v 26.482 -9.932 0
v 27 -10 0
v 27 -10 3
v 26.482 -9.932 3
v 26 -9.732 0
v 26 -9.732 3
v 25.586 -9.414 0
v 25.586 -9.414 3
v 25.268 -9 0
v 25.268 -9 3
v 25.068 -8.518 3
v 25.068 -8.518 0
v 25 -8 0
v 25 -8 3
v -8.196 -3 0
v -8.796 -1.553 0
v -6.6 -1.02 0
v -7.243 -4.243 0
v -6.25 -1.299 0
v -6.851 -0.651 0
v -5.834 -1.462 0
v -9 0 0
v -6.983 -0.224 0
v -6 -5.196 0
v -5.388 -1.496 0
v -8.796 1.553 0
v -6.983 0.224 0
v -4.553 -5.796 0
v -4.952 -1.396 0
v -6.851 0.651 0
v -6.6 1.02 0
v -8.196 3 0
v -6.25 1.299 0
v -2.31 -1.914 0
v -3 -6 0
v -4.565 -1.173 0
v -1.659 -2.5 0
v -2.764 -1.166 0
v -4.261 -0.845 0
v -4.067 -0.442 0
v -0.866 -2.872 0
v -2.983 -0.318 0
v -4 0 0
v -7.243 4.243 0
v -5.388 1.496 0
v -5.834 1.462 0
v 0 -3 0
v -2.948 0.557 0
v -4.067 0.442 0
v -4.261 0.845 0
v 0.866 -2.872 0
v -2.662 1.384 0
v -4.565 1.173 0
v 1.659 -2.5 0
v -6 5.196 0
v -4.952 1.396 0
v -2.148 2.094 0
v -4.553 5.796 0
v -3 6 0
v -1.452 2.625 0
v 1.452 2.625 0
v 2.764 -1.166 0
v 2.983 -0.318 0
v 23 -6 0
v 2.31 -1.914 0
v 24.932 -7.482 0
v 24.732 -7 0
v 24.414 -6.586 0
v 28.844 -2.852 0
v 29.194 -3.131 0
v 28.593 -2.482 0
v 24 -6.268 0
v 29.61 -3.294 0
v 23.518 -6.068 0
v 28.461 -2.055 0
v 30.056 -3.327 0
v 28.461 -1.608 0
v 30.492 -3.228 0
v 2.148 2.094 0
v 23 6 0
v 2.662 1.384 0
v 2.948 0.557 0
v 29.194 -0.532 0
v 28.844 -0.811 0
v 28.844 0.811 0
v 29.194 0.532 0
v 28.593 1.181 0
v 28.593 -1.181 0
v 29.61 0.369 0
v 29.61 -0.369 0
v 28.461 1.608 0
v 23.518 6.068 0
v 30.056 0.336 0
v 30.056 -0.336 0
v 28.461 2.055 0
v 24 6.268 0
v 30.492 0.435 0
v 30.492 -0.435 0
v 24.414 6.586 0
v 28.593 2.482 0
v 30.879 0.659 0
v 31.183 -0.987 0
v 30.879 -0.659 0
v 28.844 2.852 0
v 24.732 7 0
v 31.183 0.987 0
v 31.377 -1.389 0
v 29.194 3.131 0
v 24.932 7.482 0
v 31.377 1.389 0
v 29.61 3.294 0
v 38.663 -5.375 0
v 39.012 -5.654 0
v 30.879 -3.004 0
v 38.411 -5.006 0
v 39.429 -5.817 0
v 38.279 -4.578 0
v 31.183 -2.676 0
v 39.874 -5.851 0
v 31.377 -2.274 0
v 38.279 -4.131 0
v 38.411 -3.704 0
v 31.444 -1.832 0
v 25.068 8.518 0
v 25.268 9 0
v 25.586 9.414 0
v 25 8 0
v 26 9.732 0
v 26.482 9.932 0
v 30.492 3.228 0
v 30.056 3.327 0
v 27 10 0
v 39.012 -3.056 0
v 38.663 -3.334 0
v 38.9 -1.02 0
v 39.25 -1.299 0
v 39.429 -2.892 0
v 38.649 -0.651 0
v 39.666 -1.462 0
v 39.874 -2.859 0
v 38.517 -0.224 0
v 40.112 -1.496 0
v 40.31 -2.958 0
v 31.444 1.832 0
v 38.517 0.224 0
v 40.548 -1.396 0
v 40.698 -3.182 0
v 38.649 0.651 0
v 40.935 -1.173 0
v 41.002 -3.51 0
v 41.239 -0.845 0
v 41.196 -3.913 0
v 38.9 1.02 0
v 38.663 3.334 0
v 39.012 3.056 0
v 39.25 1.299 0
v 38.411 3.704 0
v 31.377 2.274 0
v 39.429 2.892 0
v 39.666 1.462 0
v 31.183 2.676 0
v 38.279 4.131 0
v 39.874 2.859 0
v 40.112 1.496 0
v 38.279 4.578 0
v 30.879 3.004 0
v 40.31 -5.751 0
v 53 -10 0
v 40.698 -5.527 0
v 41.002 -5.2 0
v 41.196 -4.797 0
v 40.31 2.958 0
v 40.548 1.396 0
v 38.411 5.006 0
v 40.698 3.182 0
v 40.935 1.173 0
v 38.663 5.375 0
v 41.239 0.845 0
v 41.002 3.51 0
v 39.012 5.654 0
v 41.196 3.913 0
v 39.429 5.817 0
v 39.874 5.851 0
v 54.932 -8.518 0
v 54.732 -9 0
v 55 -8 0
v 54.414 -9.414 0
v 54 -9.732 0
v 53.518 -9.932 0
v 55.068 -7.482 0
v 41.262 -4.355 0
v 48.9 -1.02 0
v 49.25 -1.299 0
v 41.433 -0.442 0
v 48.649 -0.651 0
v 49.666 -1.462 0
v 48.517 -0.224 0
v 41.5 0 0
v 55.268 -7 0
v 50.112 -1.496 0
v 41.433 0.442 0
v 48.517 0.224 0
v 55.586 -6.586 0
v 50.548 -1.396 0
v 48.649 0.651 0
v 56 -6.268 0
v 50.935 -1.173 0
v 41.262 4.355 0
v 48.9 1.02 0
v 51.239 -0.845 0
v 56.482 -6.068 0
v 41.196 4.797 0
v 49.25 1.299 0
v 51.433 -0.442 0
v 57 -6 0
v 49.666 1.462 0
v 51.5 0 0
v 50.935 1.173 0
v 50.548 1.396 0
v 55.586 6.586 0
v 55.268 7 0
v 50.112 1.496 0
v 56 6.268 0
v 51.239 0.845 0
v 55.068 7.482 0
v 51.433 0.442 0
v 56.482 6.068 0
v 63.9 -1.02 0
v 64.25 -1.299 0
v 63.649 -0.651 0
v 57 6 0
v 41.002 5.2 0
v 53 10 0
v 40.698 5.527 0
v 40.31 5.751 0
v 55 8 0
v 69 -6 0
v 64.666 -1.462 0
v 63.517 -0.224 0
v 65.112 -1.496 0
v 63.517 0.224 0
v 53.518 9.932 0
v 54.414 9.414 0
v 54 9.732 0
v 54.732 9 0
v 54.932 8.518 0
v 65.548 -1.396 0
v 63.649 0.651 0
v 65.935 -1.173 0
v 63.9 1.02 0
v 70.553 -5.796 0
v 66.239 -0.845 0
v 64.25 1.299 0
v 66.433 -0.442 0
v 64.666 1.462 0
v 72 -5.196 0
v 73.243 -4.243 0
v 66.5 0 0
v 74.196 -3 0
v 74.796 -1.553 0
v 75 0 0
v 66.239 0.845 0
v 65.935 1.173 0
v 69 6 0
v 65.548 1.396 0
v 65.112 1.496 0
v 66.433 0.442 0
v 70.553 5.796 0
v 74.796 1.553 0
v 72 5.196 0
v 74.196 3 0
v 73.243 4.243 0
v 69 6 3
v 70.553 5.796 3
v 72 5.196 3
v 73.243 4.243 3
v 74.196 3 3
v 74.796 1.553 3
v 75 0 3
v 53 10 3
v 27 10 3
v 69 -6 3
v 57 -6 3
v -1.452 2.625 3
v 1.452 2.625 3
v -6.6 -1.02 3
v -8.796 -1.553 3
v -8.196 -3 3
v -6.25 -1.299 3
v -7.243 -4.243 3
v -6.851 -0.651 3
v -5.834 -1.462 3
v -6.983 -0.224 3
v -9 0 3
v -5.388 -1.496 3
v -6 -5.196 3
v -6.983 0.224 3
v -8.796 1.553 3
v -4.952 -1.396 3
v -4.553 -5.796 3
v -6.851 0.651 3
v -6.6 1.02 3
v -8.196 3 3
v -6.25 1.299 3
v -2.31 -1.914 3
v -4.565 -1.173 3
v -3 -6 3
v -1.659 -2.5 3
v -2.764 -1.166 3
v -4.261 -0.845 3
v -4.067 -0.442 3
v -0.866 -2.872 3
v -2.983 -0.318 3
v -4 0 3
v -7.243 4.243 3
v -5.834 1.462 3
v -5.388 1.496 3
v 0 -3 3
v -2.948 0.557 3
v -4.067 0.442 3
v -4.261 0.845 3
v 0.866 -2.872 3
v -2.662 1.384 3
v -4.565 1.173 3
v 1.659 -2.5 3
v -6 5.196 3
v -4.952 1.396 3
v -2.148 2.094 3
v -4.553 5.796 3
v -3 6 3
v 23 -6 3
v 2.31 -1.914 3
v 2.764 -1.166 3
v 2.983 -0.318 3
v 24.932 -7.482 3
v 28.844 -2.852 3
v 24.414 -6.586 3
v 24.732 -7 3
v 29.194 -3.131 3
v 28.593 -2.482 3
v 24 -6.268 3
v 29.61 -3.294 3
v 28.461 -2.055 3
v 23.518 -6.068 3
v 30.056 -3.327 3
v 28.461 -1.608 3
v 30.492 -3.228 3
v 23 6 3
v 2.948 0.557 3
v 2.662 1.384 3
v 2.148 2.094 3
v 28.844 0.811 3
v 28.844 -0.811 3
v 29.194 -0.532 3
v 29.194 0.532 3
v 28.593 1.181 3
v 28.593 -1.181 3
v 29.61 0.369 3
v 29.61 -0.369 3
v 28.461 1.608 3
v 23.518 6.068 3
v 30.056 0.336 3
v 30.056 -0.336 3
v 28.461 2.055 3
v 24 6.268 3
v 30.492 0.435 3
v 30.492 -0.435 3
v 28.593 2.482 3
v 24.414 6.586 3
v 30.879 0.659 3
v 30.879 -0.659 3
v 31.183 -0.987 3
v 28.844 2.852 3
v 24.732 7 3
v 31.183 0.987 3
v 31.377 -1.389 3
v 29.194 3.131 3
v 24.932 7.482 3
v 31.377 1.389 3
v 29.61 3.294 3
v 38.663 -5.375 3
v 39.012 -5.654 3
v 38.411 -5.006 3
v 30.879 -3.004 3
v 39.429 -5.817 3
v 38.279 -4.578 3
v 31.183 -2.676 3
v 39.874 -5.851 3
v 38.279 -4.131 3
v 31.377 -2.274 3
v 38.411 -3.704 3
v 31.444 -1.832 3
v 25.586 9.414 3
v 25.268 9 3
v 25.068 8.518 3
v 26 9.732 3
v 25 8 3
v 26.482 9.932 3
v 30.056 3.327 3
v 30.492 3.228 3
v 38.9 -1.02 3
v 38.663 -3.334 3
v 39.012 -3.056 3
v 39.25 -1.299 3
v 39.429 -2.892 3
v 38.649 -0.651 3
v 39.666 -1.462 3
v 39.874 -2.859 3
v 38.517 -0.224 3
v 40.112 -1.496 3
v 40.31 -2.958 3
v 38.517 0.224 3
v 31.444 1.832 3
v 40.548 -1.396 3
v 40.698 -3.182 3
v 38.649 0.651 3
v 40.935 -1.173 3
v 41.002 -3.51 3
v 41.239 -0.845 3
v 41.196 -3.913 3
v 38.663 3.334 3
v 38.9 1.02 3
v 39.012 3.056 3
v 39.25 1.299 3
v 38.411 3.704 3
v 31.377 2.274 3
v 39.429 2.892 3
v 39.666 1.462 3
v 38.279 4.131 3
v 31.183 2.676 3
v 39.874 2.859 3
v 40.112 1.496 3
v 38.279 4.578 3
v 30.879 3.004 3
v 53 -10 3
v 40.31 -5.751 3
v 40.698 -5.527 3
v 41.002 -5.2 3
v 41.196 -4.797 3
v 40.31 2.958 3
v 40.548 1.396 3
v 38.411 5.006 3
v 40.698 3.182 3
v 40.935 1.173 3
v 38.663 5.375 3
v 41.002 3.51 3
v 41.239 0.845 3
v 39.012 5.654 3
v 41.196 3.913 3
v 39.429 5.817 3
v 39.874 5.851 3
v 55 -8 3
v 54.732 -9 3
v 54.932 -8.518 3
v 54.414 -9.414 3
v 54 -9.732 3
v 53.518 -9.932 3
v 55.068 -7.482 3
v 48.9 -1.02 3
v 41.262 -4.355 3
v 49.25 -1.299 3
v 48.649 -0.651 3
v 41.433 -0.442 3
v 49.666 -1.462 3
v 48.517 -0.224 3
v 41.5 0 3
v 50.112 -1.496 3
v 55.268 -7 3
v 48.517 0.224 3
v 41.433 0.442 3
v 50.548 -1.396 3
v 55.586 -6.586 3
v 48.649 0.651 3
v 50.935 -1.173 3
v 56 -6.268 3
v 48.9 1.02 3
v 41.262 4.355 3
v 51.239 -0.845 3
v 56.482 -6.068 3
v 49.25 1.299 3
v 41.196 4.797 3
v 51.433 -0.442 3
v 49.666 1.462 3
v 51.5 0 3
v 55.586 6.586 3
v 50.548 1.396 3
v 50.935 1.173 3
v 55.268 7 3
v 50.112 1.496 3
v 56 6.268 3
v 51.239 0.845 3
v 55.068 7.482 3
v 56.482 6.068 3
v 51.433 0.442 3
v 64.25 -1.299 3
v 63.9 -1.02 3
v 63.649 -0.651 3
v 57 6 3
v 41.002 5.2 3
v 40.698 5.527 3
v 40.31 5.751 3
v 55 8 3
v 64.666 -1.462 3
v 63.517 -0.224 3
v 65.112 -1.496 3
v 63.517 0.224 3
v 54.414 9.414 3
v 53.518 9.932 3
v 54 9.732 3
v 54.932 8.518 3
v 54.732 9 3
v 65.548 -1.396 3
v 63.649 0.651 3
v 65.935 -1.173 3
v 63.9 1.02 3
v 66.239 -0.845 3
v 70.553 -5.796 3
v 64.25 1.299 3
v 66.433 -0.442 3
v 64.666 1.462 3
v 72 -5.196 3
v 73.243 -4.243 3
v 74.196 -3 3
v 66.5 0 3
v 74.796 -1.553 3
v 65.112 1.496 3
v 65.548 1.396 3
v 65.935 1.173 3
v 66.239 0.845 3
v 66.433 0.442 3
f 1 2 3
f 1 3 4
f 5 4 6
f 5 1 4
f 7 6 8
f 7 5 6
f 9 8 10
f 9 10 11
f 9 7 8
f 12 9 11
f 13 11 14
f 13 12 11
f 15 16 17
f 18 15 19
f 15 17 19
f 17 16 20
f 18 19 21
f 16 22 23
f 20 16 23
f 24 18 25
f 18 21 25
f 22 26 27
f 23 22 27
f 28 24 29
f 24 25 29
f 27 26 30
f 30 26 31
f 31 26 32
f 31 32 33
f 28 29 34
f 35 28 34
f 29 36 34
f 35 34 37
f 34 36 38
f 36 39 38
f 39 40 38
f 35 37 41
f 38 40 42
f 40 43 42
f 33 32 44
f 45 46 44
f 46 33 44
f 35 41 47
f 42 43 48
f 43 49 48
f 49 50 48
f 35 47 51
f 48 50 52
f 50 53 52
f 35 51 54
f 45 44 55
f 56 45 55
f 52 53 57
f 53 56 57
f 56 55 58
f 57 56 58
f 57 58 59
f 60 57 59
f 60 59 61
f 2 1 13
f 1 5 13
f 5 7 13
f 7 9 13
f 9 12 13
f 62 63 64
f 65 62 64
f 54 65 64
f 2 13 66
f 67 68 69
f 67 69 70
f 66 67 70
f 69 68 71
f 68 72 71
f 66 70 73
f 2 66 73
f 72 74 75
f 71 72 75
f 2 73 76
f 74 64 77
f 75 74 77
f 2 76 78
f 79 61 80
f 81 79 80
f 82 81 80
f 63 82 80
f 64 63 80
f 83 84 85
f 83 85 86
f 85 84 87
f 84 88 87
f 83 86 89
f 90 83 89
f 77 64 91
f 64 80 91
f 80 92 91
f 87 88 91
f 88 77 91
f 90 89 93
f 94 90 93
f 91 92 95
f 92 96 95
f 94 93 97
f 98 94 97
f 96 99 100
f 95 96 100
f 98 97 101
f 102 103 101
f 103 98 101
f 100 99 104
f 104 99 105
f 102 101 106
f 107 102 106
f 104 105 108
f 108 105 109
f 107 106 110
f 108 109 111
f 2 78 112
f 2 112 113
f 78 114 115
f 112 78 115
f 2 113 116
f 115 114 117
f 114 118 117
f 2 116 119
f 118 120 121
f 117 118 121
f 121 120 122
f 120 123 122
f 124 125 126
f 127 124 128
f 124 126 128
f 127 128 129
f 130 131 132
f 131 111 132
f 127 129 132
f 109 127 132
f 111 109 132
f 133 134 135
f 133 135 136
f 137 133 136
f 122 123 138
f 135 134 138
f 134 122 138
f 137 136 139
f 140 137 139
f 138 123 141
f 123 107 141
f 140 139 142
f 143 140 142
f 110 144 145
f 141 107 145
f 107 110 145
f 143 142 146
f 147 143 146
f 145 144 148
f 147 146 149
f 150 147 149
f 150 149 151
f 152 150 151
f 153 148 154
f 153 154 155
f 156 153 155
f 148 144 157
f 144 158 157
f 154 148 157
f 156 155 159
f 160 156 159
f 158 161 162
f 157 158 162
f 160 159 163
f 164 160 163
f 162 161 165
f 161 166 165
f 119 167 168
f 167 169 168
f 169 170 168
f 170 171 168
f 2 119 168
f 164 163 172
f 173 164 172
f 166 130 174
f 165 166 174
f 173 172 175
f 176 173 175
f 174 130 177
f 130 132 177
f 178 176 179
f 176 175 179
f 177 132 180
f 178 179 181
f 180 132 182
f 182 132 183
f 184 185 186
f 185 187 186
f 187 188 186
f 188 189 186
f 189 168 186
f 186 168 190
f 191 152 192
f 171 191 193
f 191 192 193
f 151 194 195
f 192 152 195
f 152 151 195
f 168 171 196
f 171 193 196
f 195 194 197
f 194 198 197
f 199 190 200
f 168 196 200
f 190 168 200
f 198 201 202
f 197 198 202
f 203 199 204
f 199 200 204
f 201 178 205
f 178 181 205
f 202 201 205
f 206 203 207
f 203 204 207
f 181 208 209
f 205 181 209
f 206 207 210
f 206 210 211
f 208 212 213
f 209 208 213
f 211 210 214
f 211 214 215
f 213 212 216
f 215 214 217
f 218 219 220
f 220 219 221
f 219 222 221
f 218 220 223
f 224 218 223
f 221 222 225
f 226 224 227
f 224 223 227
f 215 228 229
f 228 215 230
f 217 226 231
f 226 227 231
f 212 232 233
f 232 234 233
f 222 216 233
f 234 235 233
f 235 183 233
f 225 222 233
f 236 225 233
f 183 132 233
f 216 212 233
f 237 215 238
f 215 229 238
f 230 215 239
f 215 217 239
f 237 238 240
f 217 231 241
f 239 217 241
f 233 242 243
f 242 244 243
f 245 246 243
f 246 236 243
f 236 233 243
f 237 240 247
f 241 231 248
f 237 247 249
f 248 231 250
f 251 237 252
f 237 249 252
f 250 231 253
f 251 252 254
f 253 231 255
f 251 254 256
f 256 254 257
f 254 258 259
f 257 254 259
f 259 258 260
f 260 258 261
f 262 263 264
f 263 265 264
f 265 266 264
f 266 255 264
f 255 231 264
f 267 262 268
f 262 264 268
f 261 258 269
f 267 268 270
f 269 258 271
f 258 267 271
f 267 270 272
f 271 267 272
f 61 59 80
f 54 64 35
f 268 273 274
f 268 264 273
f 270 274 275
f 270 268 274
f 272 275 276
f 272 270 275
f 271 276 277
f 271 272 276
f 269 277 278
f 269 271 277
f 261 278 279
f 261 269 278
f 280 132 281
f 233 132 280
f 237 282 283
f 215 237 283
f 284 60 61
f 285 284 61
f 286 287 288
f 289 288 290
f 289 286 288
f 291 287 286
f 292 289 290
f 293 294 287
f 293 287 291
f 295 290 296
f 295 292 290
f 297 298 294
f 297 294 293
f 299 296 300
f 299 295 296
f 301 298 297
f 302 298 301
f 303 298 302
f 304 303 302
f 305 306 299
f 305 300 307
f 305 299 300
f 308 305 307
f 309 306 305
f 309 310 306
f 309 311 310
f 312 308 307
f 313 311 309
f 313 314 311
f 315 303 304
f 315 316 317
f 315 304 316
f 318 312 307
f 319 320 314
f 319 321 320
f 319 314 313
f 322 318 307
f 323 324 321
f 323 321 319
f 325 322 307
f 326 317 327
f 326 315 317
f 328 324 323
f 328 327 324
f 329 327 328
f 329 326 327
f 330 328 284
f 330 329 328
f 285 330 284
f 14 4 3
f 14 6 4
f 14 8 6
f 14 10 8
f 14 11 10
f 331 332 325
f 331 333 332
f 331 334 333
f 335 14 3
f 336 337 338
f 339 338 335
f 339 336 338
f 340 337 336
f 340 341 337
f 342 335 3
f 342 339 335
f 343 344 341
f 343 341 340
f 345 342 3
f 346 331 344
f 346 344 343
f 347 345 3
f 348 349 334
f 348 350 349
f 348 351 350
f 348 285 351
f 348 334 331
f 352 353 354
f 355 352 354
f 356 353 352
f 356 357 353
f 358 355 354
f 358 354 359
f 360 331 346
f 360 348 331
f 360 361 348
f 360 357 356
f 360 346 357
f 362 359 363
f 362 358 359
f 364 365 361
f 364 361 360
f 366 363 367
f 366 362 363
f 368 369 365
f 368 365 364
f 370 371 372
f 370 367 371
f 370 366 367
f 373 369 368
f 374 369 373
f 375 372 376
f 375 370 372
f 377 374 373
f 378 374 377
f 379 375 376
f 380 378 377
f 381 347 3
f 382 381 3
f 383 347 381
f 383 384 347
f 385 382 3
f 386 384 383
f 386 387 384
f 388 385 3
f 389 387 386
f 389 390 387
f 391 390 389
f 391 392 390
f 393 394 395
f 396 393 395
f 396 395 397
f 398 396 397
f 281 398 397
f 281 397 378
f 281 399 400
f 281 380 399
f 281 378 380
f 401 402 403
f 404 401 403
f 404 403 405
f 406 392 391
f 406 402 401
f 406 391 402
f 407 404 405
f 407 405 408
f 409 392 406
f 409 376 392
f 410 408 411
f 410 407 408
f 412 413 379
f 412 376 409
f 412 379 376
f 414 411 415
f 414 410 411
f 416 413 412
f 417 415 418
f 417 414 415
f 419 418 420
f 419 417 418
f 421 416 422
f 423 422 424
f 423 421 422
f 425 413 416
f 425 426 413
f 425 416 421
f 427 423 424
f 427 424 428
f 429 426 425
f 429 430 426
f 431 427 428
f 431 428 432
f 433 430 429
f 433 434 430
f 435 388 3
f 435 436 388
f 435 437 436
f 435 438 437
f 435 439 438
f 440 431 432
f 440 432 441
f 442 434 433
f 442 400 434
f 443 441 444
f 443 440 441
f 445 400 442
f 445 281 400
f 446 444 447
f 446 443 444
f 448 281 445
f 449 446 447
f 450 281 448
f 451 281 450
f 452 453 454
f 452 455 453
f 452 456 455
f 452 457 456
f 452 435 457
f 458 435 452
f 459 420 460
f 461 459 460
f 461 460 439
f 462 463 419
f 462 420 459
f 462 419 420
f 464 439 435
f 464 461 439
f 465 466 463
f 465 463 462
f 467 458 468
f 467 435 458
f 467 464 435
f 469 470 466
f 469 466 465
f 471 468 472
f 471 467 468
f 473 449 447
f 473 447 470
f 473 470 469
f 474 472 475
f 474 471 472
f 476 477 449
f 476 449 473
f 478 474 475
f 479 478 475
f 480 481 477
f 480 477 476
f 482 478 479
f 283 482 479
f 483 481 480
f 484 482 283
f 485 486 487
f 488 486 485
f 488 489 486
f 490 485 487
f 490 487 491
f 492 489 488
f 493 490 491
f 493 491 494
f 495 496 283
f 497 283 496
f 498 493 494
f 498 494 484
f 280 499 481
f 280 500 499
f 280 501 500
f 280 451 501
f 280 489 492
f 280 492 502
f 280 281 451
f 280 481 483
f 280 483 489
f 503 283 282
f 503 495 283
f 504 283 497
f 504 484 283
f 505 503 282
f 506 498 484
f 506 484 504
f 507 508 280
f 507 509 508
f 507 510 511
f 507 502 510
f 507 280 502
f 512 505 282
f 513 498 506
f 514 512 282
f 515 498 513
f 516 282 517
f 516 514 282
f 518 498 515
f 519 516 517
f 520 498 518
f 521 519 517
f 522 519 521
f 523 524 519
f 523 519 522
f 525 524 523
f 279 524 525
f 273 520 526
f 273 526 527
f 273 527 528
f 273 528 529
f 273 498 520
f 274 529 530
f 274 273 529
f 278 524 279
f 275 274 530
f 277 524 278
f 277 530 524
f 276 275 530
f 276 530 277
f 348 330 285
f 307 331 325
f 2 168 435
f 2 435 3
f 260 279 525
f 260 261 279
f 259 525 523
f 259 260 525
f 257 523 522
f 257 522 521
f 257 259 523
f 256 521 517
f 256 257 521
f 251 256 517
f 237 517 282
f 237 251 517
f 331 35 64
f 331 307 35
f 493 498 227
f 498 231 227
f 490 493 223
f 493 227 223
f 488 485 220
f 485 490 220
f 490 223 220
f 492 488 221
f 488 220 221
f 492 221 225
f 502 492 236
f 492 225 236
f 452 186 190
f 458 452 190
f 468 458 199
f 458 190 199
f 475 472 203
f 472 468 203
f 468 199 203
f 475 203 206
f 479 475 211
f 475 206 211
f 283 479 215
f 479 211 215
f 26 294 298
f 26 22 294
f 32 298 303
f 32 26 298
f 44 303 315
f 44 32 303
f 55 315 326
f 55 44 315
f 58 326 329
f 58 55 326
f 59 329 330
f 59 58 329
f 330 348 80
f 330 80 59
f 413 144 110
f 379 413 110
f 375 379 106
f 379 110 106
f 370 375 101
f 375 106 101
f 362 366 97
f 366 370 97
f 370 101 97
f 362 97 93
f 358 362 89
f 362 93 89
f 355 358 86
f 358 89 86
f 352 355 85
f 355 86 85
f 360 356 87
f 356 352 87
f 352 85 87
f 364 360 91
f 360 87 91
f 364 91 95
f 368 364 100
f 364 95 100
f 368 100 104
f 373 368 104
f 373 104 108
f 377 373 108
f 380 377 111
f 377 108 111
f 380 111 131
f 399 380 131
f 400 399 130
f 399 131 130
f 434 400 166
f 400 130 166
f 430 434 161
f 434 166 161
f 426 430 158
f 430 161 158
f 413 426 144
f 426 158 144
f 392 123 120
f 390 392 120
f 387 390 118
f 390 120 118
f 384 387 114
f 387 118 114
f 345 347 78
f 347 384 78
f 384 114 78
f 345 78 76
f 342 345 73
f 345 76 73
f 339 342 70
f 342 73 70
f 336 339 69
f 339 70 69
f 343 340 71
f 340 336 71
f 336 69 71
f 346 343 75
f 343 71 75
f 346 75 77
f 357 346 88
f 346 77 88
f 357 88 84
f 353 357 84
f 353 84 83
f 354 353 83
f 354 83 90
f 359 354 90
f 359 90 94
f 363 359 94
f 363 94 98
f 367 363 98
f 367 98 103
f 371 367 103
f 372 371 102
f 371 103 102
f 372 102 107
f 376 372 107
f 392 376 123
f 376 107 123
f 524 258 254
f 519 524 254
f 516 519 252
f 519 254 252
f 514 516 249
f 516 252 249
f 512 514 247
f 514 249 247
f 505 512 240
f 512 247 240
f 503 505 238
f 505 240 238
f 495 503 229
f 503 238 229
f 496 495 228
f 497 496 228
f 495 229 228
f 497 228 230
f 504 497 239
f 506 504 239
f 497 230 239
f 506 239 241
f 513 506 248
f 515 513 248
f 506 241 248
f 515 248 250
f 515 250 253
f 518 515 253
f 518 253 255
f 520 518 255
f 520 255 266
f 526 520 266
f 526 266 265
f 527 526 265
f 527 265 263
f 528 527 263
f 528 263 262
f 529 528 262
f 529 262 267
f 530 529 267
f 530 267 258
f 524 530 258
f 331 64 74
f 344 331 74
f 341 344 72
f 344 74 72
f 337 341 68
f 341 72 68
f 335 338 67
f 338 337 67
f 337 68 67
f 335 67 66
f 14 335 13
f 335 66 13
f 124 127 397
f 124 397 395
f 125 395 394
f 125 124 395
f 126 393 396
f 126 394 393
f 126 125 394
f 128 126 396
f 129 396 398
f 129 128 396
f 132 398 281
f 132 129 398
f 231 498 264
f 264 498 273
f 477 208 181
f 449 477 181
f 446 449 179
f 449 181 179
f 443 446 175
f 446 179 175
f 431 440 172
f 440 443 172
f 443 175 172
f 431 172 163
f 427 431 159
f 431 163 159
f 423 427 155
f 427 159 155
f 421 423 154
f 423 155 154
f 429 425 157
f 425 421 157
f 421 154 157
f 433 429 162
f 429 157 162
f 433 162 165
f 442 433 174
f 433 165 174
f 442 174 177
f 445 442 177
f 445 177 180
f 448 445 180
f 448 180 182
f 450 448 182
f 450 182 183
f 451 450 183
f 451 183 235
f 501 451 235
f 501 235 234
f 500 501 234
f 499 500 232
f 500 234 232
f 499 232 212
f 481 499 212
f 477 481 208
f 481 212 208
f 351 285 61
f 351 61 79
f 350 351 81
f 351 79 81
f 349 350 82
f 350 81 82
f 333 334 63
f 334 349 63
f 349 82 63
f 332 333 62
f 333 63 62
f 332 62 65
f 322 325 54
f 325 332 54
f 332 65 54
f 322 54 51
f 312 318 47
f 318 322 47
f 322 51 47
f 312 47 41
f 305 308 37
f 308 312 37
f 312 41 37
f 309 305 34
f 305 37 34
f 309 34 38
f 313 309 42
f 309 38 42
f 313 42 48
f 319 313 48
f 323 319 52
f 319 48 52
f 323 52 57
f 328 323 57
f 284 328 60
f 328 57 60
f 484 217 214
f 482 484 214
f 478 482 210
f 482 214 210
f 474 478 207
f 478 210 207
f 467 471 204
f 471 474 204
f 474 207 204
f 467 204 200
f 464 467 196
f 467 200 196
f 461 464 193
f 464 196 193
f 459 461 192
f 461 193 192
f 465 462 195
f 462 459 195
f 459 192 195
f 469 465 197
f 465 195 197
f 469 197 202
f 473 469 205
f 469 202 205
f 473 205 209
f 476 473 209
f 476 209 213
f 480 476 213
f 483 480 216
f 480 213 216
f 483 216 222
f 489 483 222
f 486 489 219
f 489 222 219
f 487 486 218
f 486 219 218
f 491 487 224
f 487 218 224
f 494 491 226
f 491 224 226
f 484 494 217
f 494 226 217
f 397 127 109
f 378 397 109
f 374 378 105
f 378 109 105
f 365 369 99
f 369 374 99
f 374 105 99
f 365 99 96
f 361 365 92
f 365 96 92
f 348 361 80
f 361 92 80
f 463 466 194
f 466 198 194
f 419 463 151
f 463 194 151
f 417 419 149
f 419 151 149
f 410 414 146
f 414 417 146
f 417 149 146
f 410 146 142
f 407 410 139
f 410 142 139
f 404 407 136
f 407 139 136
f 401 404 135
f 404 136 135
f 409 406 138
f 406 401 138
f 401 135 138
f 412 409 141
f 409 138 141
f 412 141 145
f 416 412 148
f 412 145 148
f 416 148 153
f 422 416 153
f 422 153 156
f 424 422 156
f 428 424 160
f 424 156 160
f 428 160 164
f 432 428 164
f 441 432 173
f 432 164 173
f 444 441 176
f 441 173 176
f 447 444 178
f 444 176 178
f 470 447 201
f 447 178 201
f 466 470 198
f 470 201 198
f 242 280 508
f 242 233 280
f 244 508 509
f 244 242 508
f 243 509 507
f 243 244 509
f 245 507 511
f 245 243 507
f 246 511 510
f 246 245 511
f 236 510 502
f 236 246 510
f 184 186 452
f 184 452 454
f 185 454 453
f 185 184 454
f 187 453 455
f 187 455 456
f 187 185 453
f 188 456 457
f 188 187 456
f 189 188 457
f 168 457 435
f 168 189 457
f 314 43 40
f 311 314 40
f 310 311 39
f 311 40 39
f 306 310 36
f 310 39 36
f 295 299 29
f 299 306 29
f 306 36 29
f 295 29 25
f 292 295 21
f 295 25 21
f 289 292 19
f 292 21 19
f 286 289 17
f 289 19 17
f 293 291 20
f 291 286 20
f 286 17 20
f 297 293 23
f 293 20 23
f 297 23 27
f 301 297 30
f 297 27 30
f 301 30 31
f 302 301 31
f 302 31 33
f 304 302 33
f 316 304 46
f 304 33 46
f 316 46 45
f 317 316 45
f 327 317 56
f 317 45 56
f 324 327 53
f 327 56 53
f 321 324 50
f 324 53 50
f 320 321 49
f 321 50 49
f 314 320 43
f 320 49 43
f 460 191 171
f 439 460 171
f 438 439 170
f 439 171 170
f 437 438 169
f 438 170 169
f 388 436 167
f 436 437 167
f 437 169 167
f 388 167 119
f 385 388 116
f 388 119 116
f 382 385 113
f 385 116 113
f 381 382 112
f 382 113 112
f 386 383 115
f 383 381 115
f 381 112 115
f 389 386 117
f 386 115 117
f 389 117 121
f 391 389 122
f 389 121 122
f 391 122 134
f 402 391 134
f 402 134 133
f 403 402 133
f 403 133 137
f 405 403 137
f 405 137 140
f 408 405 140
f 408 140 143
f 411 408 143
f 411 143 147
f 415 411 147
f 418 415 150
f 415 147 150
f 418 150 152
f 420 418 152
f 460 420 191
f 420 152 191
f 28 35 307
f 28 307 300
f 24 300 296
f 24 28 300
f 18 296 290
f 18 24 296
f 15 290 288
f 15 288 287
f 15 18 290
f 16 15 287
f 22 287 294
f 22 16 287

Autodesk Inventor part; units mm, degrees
ref_plane "YZ Plane" through (0, 0, 0) normal (1, 0, 0) x (0, 1, 0)
ref_plane "XZ Plane" through (0, 0, 0) normal (0, 1, 0) x (-1, 0, 0)
ref_plane "XY Plane" through (0, 0, 0) normal (0, 0, 1) x (1, 0, 0)
sketch "Sketch1" plane through (0, 0, 0) normal (0, 0, 1) x (1, 0, 0)
  circle A0 centre (0, 0) radius 3
  line L0 (-1.4524, 2.625) -> (1.4524, 2.625)
  line L1 (-4.1421, -10) -> (-10, -4.1421)
  line L2 (-10, -4.1421) -> (-10, 4.1421)
  line L3 (-10, 4.1421) -> (-4.1421, 10)
  line L4 (-4.1421, 10) -> (4.1421, 10)
  line L5 (4.1421, 10) -> (10, 4.1421)
  line L6 (10, 4.1421) -> (10, -4.1421)
  line L7 (10, -4.1421) -> (4.1421, -10)
  line L8 (4.1421, -10) -> (-4.1421, -10)
  circle A1 centre (29.944, -1.8315) radius 1.5
  circle A2 centre (29.944, 1.8315) radius 1.5
  circle A3 centre (0, 0) radius 30 construction
  line L9 (0, 0) -> (30, 0) construction
  line L10 (0, 0) -> (29.944, 1.8315) construction
  line L11 (0, 0) -> (29.944, -1.8315) construction
  circle A4 centre (0, 0) radius 40 construction
  circle A5 centre (39.7623, 4.3547) radius 1.5
  circle A6 centre (40, 0) radius 1.5
  circle A7 centre (39.7623, -4.3547) radius 1.5
  line L12 (0, 0) -> (39.7623, 4.3547) construction
  line L13 (40, 0) -> (0, 0) construction
  line L14 (0, 0) -> (39.7623, -4.3547) construction
  circle A8 centre (50, 0) radius 1.5
  circle A9 centre (65, 0) radius 1.5
  circle A10 centre (-5.5, 0) radius 1.5
  line L15 (0, 0) -> (65, 0) construction
  line L16 (0, -10) -> (65, -10)
  line L17 (65, 10) -> (0, 10)
  arc A11 (0, 10) -> (0, -10) centre (0, 0) ccw
  arc A12 (65, -10) -> (65, 10) centre (65, 0) ccw
  line L18 (0, 10) -> (-10, 10)
  line L19 (-10, 10) -> (-10, -10)
  line L20 (-10, -10) -> (0, -10)
  line L21 (0, -10) -> (0, 10)
  line L22 (65, 10) -> (75, 10)
  line L23 (75, 10) -> (75, -10)
  line L24 (75, -10) -> (65, -10)
  line L25 (65, -10) -> (65, 10)
  point P0 (32.5, 0)
  point P1 (4.1421, -10)
  point P2 (0, 10)
  point P3 (0, 0)
  point P4 (65, 0)
  point P5 (75, 0)
  point P6 (-10, 0)
  dimension "d0" = 6
  dimension "d1" = 2.625
  dimension "d2" = 20
  dimension "d3" = 3
  dimension "d4" = 3
  dimension "d5" = 60
  dimension "d6" = 3.5
  dimension "d7" = 3.5
  dimension "d8" = 80
  dimension "d9" = 3
  dimension "d10" = 3
  dimension "d11" = 3
  dimension "d12" = 0
  dimension "d13" = 6.25
  dimension "d14" = 6.25
  dimension "d15" = 3
  dimension "d16" = 3
  dimension "d17" = 0
  dimension "d18" = 50
  dimension "d19" = 0
  dimension "d20" = 65
  dimension "d21" = 3
  dimension "d22" = 0
  dimension "d23" = 5.5
  dimension "d24" = 20
  dimension "d36" = 10
  dimension "d37" = 10
  dimension "d38" = 20
  dimension "d44" = 10
extrude "Extrusion1" add sketch "Sketch1" along normal blind 3 contours A0 L21 L4 L5 L6 L7 L8 | L0 L21 A0 | L21 A11 A0 | L21 L0 A0 | L8 L1 A11 | A11 L3 L4 | L7 L6 L5 L17 L25 A9 L16 | L20 L19 L1 | L1 L2 A11 | L3 L19 L18 | A11 L2 L3 | L25 A9 A12 | A12 L23 L24 | L22 L23 A12 picked at (0.8147, 2.6938) picked at (-0.8147, 2.6938)
sketch "Sketch2" plane through (0, 0, 3) normal (0, 0, 1) x (1, 0, 0)
  line L0 (75, 10) -> (-10, 10) projected
  line L1 (-10, -10) -> (75, -10) projected
  line L2 (25, 10) -> (55, 10)
  line L3 (55, 10) -> (55, -10)
  line L4 (55, -10) -> (25, -10)
  line L5 (25, -10) -> (25, 10)
  line L6 (25, 6) -> (-9, 6)
  line L7 (-9, 6) -> (-9, -6)
  line L8 (-9, -6) -> (25, -6)
  line L9 (25, -6) -> (25, 6)
  line L10 (55, 6) -> (75, 6)
  line L11 (75, 6) -> (75, -6)
  line L12 (75, -6) -> (55, -6)
  line L13 (55, -6) -> (55, 6)
  circle A0 centre (65, 0) radius 1.5 projected
  line L14 (75, 10) -> (-10, 10) projected
  line L15 (-10, 10) -> (-10, -10) projected
  line L16 (-10, -10) -> (75, -10) projected
  line L17 (75, -10) -> (75, 10) projected
  arc A1 (-1.4524, 2.625) -> (1.4524, 2.625) centre (0, 0) ccw projected
  circle A2 centre (29.944, -1.8315) radius 1.5 projected
  circle A3 centre (29.944, 1.8315) radius 1.5 projected
  circle A4 centre (39.7623, 4.3547) radius 1.5 projected
  circle A5 centre (40, 0) radius 1.5 projected
  circle A6 centre (39.7623, -4.3547) radius 1.5 projected
  circle A7 centre (50, 0) radius 1.5 projected
  circle A8 centre (65, 0) radius 1.5 projected
  line L18 (-1.4524, 2.625) -> (1.4524, 2.625) projected
  point P0 (-9, 0)
  point P1 (55, -6)
  point P2 (-10, -6)
  point P3 (-10, -10)
  point P4 (25, -6)
  point P5 (-10, 6)
  dimension "d28" = 6
  dimension "d29" = 6
  dimension "d30" = 9
  dimension "d31" = 6
  dimension "d32" = 10
  dimension "d33" = 6
  dimension "d34" = 10
  dimension "d39" = 25
extrude "Extrusion2" cut sketch "Sketch2" against normal up to surface (3 mm away) contours L17 L10 L3 L0 | L5 L6 L7 L8 L1 L15 L0 | L17 L1 L3 L12
fillet "Fillet1" radius 2 8 edges at (25, -6, 1.5) (25, -10, 1.5) (55, -10, 1.5) (55, -6, 1.5) (25, 10, 1.5) (25, 6, 1.5) (55, 10, 1.5) (55, 6, 1.5)
fillet "Fillet1" radius 6 4 edges at (75, 6, 1.5) (75, -6, 1.5) (-9, 6, 1.5) (-9, -6, 1.5)
equation "\"d7\" = d6"
equation "\"d14\" = d13"
equation "\"d29\" = d28"
equation "\"d31\" = d28"
equation "\"d33\" = d28"
properties part number "Arm1" material "Aluminum 6061, Welded"
